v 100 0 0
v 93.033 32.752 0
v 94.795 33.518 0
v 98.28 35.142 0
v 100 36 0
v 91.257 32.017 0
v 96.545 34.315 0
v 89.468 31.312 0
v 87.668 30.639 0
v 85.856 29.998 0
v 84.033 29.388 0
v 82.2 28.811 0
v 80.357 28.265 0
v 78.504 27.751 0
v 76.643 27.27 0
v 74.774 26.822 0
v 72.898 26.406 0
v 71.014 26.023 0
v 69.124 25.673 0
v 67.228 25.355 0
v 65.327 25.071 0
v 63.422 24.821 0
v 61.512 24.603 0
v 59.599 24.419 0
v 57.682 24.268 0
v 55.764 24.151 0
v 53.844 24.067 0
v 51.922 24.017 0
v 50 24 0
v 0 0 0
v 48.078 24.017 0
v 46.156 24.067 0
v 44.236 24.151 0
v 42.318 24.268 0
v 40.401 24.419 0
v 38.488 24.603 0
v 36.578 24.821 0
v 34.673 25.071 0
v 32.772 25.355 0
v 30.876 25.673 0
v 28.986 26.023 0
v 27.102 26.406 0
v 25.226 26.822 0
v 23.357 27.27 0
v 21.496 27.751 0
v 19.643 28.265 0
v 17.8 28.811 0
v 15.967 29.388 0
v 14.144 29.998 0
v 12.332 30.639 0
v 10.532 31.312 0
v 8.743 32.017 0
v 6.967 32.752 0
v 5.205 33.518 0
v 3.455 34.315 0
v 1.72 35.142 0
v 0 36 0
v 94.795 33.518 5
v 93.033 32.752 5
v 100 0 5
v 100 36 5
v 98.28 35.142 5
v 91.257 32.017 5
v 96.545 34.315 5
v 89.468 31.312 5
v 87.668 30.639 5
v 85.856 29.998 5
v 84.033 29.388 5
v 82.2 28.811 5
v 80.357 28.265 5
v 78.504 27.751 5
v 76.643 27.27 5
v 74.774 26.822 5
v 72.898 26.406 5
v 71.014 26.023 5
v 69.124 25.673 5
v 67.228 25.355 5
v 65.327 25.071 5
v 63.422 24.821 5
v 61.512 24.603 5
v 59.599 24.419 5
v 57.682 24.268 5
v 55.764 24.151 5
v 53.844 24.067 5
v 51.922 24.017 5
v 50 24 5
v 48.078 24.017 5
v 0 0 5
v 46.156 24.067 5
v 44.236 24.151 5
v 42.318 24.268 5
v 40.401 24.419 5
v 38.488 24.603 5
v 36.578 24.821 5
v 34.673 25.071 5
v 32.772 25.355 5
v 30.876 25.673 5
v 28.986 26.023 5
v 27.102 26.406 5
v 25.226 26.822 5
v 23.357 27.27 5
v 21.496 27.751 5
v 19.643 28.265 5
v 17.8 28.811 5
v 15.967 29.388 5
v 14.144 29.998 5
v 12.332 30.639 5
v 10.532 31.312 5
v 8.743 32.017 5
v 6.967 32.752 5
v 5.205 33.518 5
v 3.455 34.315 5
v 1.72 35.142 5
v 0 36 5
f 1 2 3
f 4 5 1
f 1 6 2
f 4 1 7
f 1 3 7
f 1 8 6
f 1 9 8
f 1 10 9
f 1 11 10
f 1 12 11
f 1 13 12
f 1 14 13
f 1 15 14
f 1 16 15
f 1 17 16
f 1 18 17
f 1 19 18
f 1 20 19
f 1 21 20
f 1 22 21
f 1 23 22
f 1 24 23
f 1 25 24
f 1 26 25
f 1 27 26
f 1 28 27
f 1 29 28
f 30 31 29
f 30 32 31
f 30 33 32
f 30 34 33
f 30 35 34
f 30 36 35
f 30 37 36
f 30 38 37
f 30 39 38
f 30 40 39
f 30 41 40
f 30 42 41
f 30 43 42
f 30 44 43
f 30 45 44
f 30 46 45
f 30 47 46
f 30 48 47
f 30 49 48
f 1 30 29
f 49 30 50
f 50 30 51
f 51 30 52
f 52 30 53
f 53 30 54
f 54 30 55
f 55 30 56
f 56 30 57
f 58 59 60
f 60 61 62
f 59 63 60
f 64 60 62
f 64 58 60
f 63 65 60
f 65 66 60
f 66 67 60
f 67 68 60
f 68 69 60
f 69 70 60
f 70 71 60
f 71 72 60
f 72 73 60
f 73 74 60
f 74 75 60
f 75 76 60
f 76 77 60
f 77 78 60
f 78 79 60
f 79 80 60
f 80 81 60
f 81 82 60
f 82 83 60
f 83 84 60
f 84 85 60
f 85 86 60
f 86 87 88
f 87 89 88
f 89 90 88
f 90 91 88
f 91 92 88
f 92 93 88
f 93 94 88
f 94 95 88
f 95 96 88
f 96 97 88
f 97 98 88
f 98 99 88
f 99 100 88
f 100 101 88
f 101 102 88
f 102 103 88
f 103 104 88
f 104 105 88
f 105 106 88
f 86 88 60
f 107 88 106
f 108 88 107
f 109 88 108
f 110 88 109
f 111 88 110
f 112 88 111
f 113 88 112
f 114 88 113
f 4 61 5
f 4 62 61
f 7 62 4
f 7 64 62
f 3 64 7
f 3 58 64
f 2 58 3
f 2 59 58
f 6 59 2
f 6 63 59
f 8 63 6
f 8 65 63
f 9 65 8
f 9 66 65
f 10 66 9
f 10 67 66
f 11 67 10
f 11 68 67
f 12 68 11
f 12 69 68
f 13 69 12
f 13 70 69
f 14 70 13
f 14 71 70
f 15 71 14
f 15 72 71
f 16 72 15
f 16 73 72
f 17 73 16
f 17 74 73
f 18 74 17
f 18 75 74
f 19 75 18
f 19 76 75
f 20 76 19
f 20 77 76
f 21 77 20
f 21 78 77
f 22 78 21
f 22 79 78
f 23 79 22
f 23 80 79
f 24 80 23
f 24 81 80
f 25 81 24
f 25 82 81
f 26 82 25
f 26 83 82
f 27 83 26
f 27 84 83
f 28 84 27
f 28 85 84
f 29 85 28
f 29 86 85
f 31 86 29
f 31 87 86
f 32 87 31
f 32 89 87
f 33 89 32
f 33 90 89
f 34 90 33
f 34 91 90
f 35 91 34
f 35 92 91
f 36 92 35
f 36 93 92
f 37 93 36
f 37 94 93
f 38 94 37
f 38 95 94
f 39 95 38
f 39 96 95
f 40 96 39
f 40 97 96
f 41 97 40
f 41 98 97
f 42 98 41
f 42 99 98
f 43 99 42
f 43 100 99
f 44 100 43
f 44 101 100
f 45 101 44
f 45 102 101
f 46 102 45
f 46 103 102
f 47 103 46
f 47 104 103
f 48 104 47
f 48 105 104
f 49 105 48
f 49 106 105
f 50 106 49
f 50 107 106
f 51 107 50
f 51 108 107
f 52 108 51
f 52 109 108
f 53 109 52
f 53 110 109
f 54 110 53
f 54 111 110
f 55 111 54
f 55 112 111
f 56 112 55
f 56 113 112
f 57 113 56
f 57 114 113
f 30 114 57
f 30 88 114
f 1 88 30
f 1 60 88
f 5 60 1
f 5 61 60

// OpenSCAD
$fn = 32;

// ----------------------------------------------------------------------
// Arc profile plate: notch, 57 points
// ----------------------------------------------------------------------

// --- parameters (mm) ---
bar_l = 100;              // bar length, X
bar_w = 36;               // bar width, Y
notch_depth = 12;         // depth of the arc notch at mid-span
arc_r = 110.17;           // radius of the notch arc
arc_angle = 53.98;        // notch arc angle, degrees
arc_step = 1;             // sampling step of the notch arc, degrees
plate_t = 5;              // plate thickness, Z
fit_tol = 0.05;           // declared fit tolerance (prompt contract)
free_tol = 0.3;           // declared free tolerance (prompt contract)

profile = [[0, 0], [100, 0], [100, 36], [98.28, 35.142], [96.545, 34.315], [94.795, 33.518], [93.033, 32.752], [91.257, 32.017], [89.468, 31.312], [87.668, 30.639], [85.856, 29.998], [84.033, 29.388], [82.2, 28.811], [80.357, 28.265], [78.504, 27.751], [76.643, 27.27], [74.774, 26.822], [72.898, 26.406], [71.014, 26.023], [69.124, 25.673], [67.228, 25.355], [65.327, 25.071], [63.422, 24.821], [61.512, 24.603], [59.599, 24.419], [57.682, 24.268], [55.764, 24.151], [53.844, 24.067], [51.922, 24.017], [50, 24], [48.078, 24.017], [46.156, 24.067], [44.236, 24.151], [42.318, 24.268], [40.401, 24.419], [38.488, 24.603], [36.578, 24.821], [34.673, 25.071], [32.772, 25.355], [30.876, 25.673], [28.986, 26.023], [27.102, 26.406], [25.226, 26.822], [23.357, 27.27], [21.496, 27.751], [19.643, 28.265], [17.8, 28.811], [15.967, 29.388], [14.144, 29.998], [12.332, 30.639], [10.532, 31.312], [8.743, 32.017], [6.967, 32.752], [5.205, 33.518], [3.455, 34.315], [1.72, 35.142], [0, 36]];  // primary outline, 57 points, counter clockwise

// --- the one profile operation ---
linear_extrude(height = plate_t) polygon(points = profile);
